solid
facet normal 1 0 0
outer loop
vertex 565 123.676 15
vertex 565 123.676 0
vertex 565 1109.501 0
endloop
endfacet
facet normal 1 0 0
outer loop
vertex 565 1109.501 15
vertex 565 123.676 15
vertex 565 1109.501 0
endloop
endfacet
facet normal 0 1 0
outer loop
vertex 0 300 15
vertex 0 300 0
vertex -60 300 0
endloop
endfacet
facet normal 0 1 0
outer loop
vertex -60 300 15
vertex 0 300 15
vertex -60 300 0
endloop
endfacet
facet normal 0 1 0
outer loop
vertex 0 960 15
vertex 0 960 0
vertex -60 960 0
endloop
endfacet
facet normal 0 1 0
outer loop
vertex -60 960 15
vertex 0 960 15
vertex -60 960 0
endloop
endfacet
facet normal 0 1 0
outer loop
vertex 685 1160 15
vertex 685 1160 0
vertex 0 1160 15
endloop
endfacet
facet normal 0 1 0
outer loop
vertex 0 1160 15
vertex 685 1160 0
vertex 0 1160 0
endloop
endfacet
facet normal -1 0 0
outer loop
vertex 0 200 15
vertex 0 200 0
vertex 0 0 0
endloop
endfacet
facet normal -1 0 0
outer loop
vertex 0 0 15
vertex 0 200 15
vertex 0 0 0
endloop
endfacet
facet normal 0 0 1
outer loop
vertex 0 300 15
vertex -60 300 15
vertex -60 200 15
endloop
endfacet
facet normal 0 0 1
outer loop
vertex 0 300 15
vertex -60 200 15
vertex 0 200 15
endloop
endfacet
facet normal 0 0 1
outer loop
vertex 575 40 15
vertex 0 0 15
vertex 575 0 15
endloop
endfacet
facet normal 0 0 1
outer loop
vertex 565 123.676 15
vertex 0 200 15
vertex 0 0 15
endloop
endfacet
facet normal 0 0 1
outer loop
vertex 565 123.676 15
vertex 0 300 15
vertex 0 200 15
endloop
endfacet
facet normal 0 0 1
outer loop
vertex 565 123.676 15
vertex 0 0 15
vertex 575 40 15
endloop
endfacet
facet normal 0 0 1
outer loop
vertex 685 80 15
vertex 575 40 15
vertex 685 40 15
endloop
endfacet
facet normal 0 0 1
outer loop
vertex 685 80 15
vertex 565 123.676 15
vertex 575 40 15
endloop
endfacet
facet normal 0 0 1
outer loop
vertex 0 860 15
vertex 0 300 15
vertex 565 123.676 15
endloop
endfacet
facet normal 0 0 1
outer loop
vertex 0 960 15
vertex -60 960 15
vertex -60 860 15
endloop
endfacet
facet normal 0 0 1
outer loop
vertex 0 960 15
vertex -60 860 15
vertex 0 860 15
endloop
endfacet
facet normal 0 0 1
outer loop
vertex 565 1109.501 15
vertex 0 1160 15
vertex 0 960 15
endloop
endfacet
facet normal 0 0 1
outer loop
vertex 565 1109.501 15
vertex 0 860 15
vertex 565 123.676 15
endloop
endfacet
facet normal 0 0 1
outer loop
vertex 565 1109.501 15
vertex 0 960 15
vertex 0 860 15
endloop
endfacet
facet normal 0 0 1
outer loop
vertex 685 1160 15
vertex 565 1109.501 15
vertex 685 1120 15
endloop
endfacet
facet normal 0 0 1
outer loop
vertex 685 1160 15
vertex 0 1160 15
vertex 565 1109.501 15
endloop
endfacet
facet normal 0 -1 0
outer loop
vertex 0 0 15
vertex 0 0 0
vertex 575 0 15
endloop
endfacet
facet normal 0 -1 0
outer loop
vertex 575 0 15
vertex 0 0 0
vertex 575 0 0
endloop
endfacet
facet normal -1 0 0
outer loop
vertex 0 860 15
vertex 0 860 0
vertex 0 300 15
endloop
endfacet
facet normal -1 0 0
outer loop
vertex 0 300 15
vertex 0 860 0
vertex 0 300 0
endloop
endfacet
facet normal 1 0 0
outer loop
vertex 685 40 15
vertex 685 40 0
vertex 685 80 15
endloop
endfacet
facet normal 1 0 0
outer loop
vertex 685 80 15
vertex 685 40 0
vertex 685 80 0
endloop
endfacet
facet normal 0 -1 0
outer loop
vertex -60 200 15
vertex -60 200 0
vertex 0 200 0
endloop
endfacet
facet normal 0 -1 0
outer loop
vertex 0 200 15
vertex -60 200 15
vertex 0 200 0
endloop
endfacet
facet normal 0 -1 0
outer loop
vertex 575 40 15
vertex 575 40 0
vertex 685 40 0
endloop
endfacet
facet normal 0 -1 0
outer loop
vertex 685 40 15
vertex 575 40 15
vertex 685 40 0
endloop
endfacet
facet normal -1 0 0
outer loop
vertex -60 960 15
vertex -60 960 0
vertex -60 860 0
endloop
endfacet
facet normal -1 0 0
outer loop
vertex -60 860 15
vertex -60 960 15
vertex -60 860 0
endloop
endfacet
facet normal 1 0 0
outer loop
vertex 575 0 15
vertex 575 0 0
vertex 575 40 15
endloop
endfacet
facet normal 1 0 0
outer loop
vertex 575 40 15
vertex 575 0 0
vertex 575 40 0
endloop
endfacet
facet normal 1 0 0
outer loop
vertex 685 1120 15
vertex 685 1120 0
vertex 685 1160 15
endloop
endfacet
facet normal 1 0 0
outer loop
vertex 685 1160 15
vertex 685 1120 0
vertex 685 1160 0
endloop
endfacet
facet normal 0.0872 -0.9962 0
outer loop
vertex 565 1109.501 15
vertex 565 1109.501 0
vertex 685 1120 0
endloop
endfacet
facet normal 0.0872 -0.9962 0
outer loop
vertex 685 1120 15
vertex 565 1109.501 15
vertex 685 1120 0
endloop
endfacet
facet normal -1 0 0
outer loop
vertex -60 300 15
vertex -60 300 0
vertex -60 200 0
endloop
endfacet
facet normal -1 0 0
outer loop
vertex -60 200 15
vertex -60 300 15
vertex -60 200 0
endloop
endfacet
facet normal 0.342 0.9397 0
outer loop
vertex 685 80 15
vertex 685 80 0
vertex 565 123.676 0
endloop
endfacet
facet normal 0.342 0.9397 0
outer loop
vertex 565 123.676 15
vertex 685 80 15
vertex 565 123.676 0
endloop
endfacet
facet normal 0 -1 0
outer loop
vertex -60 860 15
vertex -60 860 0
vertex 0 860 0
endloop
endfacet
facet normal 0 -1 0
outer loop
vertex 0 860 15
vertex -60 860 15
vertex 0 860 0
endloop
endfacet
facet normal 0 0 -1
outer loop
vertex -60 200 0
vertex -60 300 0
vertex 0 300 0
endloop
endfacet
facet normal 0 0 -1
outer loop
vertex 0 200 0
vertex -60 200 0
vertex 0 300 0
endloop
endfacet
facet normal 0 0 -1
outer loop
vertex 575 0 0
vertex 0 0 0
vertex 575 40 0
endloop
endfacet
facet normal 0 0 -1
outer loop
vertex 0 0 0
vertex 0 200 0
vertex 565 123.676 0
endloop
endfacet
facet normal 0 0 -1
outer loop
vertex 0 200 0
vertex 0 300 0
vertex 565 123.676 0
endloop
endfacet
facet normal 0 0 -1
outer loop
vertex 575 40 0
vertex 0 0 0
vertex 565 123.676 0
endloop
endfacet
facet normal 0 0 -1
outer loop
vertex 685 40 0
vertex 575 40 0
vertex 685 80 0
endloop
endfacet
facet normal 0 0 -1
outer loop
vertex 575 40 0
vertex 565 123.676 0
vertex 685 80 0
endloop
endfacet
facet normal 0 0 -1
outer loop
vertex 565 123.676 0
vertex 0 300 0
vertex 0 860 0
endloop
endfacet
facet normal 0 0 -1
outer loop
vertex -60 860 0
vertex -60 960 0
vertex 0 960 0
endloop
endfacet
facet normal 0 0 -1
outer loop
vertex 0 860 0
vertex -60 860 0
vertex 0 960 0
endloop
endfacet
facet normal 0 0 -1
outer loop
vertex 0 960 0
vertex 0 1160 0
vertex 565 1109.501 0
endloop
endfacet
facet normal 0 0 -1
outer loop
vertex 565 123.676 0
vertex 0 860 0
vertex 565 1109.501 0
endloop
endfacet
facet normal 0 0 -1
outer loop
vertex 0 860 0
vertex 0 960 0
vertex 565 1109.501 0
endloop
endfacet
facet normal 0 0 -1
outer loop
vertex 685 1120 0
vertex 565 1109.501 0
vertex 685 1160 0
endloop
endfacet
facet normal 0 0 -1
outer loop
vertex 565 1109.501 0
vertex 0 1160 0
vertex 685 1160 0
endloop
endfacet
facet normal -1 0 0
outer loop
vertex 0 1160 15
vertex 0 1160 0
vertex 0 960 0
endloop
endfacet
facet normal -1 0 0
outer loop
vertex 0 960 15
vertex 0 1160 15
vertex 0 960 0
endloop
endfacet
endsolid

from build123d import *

# Parameters (mm, degrees)
F1_DEPTH = 15


with BuildPart() as f1:
    # F0 (on Top) → F1 (new body)
    with BuildSketch(Plane.XY):
        Polygon((0, 200), (0, 0), (575, 0), (575, 40), (685, 40), (685, 80), (565, 123.676428), (565, 1109.50136), (685, 1120), (685, 1160), (0, 1160), (0, 960), (-60, 960), (-60, 860), (0, 860), (0, 300), (-60, 300), (-60, 200), align=None)
    extrude(amount=F1_DEPTH)


solid = f1.part
